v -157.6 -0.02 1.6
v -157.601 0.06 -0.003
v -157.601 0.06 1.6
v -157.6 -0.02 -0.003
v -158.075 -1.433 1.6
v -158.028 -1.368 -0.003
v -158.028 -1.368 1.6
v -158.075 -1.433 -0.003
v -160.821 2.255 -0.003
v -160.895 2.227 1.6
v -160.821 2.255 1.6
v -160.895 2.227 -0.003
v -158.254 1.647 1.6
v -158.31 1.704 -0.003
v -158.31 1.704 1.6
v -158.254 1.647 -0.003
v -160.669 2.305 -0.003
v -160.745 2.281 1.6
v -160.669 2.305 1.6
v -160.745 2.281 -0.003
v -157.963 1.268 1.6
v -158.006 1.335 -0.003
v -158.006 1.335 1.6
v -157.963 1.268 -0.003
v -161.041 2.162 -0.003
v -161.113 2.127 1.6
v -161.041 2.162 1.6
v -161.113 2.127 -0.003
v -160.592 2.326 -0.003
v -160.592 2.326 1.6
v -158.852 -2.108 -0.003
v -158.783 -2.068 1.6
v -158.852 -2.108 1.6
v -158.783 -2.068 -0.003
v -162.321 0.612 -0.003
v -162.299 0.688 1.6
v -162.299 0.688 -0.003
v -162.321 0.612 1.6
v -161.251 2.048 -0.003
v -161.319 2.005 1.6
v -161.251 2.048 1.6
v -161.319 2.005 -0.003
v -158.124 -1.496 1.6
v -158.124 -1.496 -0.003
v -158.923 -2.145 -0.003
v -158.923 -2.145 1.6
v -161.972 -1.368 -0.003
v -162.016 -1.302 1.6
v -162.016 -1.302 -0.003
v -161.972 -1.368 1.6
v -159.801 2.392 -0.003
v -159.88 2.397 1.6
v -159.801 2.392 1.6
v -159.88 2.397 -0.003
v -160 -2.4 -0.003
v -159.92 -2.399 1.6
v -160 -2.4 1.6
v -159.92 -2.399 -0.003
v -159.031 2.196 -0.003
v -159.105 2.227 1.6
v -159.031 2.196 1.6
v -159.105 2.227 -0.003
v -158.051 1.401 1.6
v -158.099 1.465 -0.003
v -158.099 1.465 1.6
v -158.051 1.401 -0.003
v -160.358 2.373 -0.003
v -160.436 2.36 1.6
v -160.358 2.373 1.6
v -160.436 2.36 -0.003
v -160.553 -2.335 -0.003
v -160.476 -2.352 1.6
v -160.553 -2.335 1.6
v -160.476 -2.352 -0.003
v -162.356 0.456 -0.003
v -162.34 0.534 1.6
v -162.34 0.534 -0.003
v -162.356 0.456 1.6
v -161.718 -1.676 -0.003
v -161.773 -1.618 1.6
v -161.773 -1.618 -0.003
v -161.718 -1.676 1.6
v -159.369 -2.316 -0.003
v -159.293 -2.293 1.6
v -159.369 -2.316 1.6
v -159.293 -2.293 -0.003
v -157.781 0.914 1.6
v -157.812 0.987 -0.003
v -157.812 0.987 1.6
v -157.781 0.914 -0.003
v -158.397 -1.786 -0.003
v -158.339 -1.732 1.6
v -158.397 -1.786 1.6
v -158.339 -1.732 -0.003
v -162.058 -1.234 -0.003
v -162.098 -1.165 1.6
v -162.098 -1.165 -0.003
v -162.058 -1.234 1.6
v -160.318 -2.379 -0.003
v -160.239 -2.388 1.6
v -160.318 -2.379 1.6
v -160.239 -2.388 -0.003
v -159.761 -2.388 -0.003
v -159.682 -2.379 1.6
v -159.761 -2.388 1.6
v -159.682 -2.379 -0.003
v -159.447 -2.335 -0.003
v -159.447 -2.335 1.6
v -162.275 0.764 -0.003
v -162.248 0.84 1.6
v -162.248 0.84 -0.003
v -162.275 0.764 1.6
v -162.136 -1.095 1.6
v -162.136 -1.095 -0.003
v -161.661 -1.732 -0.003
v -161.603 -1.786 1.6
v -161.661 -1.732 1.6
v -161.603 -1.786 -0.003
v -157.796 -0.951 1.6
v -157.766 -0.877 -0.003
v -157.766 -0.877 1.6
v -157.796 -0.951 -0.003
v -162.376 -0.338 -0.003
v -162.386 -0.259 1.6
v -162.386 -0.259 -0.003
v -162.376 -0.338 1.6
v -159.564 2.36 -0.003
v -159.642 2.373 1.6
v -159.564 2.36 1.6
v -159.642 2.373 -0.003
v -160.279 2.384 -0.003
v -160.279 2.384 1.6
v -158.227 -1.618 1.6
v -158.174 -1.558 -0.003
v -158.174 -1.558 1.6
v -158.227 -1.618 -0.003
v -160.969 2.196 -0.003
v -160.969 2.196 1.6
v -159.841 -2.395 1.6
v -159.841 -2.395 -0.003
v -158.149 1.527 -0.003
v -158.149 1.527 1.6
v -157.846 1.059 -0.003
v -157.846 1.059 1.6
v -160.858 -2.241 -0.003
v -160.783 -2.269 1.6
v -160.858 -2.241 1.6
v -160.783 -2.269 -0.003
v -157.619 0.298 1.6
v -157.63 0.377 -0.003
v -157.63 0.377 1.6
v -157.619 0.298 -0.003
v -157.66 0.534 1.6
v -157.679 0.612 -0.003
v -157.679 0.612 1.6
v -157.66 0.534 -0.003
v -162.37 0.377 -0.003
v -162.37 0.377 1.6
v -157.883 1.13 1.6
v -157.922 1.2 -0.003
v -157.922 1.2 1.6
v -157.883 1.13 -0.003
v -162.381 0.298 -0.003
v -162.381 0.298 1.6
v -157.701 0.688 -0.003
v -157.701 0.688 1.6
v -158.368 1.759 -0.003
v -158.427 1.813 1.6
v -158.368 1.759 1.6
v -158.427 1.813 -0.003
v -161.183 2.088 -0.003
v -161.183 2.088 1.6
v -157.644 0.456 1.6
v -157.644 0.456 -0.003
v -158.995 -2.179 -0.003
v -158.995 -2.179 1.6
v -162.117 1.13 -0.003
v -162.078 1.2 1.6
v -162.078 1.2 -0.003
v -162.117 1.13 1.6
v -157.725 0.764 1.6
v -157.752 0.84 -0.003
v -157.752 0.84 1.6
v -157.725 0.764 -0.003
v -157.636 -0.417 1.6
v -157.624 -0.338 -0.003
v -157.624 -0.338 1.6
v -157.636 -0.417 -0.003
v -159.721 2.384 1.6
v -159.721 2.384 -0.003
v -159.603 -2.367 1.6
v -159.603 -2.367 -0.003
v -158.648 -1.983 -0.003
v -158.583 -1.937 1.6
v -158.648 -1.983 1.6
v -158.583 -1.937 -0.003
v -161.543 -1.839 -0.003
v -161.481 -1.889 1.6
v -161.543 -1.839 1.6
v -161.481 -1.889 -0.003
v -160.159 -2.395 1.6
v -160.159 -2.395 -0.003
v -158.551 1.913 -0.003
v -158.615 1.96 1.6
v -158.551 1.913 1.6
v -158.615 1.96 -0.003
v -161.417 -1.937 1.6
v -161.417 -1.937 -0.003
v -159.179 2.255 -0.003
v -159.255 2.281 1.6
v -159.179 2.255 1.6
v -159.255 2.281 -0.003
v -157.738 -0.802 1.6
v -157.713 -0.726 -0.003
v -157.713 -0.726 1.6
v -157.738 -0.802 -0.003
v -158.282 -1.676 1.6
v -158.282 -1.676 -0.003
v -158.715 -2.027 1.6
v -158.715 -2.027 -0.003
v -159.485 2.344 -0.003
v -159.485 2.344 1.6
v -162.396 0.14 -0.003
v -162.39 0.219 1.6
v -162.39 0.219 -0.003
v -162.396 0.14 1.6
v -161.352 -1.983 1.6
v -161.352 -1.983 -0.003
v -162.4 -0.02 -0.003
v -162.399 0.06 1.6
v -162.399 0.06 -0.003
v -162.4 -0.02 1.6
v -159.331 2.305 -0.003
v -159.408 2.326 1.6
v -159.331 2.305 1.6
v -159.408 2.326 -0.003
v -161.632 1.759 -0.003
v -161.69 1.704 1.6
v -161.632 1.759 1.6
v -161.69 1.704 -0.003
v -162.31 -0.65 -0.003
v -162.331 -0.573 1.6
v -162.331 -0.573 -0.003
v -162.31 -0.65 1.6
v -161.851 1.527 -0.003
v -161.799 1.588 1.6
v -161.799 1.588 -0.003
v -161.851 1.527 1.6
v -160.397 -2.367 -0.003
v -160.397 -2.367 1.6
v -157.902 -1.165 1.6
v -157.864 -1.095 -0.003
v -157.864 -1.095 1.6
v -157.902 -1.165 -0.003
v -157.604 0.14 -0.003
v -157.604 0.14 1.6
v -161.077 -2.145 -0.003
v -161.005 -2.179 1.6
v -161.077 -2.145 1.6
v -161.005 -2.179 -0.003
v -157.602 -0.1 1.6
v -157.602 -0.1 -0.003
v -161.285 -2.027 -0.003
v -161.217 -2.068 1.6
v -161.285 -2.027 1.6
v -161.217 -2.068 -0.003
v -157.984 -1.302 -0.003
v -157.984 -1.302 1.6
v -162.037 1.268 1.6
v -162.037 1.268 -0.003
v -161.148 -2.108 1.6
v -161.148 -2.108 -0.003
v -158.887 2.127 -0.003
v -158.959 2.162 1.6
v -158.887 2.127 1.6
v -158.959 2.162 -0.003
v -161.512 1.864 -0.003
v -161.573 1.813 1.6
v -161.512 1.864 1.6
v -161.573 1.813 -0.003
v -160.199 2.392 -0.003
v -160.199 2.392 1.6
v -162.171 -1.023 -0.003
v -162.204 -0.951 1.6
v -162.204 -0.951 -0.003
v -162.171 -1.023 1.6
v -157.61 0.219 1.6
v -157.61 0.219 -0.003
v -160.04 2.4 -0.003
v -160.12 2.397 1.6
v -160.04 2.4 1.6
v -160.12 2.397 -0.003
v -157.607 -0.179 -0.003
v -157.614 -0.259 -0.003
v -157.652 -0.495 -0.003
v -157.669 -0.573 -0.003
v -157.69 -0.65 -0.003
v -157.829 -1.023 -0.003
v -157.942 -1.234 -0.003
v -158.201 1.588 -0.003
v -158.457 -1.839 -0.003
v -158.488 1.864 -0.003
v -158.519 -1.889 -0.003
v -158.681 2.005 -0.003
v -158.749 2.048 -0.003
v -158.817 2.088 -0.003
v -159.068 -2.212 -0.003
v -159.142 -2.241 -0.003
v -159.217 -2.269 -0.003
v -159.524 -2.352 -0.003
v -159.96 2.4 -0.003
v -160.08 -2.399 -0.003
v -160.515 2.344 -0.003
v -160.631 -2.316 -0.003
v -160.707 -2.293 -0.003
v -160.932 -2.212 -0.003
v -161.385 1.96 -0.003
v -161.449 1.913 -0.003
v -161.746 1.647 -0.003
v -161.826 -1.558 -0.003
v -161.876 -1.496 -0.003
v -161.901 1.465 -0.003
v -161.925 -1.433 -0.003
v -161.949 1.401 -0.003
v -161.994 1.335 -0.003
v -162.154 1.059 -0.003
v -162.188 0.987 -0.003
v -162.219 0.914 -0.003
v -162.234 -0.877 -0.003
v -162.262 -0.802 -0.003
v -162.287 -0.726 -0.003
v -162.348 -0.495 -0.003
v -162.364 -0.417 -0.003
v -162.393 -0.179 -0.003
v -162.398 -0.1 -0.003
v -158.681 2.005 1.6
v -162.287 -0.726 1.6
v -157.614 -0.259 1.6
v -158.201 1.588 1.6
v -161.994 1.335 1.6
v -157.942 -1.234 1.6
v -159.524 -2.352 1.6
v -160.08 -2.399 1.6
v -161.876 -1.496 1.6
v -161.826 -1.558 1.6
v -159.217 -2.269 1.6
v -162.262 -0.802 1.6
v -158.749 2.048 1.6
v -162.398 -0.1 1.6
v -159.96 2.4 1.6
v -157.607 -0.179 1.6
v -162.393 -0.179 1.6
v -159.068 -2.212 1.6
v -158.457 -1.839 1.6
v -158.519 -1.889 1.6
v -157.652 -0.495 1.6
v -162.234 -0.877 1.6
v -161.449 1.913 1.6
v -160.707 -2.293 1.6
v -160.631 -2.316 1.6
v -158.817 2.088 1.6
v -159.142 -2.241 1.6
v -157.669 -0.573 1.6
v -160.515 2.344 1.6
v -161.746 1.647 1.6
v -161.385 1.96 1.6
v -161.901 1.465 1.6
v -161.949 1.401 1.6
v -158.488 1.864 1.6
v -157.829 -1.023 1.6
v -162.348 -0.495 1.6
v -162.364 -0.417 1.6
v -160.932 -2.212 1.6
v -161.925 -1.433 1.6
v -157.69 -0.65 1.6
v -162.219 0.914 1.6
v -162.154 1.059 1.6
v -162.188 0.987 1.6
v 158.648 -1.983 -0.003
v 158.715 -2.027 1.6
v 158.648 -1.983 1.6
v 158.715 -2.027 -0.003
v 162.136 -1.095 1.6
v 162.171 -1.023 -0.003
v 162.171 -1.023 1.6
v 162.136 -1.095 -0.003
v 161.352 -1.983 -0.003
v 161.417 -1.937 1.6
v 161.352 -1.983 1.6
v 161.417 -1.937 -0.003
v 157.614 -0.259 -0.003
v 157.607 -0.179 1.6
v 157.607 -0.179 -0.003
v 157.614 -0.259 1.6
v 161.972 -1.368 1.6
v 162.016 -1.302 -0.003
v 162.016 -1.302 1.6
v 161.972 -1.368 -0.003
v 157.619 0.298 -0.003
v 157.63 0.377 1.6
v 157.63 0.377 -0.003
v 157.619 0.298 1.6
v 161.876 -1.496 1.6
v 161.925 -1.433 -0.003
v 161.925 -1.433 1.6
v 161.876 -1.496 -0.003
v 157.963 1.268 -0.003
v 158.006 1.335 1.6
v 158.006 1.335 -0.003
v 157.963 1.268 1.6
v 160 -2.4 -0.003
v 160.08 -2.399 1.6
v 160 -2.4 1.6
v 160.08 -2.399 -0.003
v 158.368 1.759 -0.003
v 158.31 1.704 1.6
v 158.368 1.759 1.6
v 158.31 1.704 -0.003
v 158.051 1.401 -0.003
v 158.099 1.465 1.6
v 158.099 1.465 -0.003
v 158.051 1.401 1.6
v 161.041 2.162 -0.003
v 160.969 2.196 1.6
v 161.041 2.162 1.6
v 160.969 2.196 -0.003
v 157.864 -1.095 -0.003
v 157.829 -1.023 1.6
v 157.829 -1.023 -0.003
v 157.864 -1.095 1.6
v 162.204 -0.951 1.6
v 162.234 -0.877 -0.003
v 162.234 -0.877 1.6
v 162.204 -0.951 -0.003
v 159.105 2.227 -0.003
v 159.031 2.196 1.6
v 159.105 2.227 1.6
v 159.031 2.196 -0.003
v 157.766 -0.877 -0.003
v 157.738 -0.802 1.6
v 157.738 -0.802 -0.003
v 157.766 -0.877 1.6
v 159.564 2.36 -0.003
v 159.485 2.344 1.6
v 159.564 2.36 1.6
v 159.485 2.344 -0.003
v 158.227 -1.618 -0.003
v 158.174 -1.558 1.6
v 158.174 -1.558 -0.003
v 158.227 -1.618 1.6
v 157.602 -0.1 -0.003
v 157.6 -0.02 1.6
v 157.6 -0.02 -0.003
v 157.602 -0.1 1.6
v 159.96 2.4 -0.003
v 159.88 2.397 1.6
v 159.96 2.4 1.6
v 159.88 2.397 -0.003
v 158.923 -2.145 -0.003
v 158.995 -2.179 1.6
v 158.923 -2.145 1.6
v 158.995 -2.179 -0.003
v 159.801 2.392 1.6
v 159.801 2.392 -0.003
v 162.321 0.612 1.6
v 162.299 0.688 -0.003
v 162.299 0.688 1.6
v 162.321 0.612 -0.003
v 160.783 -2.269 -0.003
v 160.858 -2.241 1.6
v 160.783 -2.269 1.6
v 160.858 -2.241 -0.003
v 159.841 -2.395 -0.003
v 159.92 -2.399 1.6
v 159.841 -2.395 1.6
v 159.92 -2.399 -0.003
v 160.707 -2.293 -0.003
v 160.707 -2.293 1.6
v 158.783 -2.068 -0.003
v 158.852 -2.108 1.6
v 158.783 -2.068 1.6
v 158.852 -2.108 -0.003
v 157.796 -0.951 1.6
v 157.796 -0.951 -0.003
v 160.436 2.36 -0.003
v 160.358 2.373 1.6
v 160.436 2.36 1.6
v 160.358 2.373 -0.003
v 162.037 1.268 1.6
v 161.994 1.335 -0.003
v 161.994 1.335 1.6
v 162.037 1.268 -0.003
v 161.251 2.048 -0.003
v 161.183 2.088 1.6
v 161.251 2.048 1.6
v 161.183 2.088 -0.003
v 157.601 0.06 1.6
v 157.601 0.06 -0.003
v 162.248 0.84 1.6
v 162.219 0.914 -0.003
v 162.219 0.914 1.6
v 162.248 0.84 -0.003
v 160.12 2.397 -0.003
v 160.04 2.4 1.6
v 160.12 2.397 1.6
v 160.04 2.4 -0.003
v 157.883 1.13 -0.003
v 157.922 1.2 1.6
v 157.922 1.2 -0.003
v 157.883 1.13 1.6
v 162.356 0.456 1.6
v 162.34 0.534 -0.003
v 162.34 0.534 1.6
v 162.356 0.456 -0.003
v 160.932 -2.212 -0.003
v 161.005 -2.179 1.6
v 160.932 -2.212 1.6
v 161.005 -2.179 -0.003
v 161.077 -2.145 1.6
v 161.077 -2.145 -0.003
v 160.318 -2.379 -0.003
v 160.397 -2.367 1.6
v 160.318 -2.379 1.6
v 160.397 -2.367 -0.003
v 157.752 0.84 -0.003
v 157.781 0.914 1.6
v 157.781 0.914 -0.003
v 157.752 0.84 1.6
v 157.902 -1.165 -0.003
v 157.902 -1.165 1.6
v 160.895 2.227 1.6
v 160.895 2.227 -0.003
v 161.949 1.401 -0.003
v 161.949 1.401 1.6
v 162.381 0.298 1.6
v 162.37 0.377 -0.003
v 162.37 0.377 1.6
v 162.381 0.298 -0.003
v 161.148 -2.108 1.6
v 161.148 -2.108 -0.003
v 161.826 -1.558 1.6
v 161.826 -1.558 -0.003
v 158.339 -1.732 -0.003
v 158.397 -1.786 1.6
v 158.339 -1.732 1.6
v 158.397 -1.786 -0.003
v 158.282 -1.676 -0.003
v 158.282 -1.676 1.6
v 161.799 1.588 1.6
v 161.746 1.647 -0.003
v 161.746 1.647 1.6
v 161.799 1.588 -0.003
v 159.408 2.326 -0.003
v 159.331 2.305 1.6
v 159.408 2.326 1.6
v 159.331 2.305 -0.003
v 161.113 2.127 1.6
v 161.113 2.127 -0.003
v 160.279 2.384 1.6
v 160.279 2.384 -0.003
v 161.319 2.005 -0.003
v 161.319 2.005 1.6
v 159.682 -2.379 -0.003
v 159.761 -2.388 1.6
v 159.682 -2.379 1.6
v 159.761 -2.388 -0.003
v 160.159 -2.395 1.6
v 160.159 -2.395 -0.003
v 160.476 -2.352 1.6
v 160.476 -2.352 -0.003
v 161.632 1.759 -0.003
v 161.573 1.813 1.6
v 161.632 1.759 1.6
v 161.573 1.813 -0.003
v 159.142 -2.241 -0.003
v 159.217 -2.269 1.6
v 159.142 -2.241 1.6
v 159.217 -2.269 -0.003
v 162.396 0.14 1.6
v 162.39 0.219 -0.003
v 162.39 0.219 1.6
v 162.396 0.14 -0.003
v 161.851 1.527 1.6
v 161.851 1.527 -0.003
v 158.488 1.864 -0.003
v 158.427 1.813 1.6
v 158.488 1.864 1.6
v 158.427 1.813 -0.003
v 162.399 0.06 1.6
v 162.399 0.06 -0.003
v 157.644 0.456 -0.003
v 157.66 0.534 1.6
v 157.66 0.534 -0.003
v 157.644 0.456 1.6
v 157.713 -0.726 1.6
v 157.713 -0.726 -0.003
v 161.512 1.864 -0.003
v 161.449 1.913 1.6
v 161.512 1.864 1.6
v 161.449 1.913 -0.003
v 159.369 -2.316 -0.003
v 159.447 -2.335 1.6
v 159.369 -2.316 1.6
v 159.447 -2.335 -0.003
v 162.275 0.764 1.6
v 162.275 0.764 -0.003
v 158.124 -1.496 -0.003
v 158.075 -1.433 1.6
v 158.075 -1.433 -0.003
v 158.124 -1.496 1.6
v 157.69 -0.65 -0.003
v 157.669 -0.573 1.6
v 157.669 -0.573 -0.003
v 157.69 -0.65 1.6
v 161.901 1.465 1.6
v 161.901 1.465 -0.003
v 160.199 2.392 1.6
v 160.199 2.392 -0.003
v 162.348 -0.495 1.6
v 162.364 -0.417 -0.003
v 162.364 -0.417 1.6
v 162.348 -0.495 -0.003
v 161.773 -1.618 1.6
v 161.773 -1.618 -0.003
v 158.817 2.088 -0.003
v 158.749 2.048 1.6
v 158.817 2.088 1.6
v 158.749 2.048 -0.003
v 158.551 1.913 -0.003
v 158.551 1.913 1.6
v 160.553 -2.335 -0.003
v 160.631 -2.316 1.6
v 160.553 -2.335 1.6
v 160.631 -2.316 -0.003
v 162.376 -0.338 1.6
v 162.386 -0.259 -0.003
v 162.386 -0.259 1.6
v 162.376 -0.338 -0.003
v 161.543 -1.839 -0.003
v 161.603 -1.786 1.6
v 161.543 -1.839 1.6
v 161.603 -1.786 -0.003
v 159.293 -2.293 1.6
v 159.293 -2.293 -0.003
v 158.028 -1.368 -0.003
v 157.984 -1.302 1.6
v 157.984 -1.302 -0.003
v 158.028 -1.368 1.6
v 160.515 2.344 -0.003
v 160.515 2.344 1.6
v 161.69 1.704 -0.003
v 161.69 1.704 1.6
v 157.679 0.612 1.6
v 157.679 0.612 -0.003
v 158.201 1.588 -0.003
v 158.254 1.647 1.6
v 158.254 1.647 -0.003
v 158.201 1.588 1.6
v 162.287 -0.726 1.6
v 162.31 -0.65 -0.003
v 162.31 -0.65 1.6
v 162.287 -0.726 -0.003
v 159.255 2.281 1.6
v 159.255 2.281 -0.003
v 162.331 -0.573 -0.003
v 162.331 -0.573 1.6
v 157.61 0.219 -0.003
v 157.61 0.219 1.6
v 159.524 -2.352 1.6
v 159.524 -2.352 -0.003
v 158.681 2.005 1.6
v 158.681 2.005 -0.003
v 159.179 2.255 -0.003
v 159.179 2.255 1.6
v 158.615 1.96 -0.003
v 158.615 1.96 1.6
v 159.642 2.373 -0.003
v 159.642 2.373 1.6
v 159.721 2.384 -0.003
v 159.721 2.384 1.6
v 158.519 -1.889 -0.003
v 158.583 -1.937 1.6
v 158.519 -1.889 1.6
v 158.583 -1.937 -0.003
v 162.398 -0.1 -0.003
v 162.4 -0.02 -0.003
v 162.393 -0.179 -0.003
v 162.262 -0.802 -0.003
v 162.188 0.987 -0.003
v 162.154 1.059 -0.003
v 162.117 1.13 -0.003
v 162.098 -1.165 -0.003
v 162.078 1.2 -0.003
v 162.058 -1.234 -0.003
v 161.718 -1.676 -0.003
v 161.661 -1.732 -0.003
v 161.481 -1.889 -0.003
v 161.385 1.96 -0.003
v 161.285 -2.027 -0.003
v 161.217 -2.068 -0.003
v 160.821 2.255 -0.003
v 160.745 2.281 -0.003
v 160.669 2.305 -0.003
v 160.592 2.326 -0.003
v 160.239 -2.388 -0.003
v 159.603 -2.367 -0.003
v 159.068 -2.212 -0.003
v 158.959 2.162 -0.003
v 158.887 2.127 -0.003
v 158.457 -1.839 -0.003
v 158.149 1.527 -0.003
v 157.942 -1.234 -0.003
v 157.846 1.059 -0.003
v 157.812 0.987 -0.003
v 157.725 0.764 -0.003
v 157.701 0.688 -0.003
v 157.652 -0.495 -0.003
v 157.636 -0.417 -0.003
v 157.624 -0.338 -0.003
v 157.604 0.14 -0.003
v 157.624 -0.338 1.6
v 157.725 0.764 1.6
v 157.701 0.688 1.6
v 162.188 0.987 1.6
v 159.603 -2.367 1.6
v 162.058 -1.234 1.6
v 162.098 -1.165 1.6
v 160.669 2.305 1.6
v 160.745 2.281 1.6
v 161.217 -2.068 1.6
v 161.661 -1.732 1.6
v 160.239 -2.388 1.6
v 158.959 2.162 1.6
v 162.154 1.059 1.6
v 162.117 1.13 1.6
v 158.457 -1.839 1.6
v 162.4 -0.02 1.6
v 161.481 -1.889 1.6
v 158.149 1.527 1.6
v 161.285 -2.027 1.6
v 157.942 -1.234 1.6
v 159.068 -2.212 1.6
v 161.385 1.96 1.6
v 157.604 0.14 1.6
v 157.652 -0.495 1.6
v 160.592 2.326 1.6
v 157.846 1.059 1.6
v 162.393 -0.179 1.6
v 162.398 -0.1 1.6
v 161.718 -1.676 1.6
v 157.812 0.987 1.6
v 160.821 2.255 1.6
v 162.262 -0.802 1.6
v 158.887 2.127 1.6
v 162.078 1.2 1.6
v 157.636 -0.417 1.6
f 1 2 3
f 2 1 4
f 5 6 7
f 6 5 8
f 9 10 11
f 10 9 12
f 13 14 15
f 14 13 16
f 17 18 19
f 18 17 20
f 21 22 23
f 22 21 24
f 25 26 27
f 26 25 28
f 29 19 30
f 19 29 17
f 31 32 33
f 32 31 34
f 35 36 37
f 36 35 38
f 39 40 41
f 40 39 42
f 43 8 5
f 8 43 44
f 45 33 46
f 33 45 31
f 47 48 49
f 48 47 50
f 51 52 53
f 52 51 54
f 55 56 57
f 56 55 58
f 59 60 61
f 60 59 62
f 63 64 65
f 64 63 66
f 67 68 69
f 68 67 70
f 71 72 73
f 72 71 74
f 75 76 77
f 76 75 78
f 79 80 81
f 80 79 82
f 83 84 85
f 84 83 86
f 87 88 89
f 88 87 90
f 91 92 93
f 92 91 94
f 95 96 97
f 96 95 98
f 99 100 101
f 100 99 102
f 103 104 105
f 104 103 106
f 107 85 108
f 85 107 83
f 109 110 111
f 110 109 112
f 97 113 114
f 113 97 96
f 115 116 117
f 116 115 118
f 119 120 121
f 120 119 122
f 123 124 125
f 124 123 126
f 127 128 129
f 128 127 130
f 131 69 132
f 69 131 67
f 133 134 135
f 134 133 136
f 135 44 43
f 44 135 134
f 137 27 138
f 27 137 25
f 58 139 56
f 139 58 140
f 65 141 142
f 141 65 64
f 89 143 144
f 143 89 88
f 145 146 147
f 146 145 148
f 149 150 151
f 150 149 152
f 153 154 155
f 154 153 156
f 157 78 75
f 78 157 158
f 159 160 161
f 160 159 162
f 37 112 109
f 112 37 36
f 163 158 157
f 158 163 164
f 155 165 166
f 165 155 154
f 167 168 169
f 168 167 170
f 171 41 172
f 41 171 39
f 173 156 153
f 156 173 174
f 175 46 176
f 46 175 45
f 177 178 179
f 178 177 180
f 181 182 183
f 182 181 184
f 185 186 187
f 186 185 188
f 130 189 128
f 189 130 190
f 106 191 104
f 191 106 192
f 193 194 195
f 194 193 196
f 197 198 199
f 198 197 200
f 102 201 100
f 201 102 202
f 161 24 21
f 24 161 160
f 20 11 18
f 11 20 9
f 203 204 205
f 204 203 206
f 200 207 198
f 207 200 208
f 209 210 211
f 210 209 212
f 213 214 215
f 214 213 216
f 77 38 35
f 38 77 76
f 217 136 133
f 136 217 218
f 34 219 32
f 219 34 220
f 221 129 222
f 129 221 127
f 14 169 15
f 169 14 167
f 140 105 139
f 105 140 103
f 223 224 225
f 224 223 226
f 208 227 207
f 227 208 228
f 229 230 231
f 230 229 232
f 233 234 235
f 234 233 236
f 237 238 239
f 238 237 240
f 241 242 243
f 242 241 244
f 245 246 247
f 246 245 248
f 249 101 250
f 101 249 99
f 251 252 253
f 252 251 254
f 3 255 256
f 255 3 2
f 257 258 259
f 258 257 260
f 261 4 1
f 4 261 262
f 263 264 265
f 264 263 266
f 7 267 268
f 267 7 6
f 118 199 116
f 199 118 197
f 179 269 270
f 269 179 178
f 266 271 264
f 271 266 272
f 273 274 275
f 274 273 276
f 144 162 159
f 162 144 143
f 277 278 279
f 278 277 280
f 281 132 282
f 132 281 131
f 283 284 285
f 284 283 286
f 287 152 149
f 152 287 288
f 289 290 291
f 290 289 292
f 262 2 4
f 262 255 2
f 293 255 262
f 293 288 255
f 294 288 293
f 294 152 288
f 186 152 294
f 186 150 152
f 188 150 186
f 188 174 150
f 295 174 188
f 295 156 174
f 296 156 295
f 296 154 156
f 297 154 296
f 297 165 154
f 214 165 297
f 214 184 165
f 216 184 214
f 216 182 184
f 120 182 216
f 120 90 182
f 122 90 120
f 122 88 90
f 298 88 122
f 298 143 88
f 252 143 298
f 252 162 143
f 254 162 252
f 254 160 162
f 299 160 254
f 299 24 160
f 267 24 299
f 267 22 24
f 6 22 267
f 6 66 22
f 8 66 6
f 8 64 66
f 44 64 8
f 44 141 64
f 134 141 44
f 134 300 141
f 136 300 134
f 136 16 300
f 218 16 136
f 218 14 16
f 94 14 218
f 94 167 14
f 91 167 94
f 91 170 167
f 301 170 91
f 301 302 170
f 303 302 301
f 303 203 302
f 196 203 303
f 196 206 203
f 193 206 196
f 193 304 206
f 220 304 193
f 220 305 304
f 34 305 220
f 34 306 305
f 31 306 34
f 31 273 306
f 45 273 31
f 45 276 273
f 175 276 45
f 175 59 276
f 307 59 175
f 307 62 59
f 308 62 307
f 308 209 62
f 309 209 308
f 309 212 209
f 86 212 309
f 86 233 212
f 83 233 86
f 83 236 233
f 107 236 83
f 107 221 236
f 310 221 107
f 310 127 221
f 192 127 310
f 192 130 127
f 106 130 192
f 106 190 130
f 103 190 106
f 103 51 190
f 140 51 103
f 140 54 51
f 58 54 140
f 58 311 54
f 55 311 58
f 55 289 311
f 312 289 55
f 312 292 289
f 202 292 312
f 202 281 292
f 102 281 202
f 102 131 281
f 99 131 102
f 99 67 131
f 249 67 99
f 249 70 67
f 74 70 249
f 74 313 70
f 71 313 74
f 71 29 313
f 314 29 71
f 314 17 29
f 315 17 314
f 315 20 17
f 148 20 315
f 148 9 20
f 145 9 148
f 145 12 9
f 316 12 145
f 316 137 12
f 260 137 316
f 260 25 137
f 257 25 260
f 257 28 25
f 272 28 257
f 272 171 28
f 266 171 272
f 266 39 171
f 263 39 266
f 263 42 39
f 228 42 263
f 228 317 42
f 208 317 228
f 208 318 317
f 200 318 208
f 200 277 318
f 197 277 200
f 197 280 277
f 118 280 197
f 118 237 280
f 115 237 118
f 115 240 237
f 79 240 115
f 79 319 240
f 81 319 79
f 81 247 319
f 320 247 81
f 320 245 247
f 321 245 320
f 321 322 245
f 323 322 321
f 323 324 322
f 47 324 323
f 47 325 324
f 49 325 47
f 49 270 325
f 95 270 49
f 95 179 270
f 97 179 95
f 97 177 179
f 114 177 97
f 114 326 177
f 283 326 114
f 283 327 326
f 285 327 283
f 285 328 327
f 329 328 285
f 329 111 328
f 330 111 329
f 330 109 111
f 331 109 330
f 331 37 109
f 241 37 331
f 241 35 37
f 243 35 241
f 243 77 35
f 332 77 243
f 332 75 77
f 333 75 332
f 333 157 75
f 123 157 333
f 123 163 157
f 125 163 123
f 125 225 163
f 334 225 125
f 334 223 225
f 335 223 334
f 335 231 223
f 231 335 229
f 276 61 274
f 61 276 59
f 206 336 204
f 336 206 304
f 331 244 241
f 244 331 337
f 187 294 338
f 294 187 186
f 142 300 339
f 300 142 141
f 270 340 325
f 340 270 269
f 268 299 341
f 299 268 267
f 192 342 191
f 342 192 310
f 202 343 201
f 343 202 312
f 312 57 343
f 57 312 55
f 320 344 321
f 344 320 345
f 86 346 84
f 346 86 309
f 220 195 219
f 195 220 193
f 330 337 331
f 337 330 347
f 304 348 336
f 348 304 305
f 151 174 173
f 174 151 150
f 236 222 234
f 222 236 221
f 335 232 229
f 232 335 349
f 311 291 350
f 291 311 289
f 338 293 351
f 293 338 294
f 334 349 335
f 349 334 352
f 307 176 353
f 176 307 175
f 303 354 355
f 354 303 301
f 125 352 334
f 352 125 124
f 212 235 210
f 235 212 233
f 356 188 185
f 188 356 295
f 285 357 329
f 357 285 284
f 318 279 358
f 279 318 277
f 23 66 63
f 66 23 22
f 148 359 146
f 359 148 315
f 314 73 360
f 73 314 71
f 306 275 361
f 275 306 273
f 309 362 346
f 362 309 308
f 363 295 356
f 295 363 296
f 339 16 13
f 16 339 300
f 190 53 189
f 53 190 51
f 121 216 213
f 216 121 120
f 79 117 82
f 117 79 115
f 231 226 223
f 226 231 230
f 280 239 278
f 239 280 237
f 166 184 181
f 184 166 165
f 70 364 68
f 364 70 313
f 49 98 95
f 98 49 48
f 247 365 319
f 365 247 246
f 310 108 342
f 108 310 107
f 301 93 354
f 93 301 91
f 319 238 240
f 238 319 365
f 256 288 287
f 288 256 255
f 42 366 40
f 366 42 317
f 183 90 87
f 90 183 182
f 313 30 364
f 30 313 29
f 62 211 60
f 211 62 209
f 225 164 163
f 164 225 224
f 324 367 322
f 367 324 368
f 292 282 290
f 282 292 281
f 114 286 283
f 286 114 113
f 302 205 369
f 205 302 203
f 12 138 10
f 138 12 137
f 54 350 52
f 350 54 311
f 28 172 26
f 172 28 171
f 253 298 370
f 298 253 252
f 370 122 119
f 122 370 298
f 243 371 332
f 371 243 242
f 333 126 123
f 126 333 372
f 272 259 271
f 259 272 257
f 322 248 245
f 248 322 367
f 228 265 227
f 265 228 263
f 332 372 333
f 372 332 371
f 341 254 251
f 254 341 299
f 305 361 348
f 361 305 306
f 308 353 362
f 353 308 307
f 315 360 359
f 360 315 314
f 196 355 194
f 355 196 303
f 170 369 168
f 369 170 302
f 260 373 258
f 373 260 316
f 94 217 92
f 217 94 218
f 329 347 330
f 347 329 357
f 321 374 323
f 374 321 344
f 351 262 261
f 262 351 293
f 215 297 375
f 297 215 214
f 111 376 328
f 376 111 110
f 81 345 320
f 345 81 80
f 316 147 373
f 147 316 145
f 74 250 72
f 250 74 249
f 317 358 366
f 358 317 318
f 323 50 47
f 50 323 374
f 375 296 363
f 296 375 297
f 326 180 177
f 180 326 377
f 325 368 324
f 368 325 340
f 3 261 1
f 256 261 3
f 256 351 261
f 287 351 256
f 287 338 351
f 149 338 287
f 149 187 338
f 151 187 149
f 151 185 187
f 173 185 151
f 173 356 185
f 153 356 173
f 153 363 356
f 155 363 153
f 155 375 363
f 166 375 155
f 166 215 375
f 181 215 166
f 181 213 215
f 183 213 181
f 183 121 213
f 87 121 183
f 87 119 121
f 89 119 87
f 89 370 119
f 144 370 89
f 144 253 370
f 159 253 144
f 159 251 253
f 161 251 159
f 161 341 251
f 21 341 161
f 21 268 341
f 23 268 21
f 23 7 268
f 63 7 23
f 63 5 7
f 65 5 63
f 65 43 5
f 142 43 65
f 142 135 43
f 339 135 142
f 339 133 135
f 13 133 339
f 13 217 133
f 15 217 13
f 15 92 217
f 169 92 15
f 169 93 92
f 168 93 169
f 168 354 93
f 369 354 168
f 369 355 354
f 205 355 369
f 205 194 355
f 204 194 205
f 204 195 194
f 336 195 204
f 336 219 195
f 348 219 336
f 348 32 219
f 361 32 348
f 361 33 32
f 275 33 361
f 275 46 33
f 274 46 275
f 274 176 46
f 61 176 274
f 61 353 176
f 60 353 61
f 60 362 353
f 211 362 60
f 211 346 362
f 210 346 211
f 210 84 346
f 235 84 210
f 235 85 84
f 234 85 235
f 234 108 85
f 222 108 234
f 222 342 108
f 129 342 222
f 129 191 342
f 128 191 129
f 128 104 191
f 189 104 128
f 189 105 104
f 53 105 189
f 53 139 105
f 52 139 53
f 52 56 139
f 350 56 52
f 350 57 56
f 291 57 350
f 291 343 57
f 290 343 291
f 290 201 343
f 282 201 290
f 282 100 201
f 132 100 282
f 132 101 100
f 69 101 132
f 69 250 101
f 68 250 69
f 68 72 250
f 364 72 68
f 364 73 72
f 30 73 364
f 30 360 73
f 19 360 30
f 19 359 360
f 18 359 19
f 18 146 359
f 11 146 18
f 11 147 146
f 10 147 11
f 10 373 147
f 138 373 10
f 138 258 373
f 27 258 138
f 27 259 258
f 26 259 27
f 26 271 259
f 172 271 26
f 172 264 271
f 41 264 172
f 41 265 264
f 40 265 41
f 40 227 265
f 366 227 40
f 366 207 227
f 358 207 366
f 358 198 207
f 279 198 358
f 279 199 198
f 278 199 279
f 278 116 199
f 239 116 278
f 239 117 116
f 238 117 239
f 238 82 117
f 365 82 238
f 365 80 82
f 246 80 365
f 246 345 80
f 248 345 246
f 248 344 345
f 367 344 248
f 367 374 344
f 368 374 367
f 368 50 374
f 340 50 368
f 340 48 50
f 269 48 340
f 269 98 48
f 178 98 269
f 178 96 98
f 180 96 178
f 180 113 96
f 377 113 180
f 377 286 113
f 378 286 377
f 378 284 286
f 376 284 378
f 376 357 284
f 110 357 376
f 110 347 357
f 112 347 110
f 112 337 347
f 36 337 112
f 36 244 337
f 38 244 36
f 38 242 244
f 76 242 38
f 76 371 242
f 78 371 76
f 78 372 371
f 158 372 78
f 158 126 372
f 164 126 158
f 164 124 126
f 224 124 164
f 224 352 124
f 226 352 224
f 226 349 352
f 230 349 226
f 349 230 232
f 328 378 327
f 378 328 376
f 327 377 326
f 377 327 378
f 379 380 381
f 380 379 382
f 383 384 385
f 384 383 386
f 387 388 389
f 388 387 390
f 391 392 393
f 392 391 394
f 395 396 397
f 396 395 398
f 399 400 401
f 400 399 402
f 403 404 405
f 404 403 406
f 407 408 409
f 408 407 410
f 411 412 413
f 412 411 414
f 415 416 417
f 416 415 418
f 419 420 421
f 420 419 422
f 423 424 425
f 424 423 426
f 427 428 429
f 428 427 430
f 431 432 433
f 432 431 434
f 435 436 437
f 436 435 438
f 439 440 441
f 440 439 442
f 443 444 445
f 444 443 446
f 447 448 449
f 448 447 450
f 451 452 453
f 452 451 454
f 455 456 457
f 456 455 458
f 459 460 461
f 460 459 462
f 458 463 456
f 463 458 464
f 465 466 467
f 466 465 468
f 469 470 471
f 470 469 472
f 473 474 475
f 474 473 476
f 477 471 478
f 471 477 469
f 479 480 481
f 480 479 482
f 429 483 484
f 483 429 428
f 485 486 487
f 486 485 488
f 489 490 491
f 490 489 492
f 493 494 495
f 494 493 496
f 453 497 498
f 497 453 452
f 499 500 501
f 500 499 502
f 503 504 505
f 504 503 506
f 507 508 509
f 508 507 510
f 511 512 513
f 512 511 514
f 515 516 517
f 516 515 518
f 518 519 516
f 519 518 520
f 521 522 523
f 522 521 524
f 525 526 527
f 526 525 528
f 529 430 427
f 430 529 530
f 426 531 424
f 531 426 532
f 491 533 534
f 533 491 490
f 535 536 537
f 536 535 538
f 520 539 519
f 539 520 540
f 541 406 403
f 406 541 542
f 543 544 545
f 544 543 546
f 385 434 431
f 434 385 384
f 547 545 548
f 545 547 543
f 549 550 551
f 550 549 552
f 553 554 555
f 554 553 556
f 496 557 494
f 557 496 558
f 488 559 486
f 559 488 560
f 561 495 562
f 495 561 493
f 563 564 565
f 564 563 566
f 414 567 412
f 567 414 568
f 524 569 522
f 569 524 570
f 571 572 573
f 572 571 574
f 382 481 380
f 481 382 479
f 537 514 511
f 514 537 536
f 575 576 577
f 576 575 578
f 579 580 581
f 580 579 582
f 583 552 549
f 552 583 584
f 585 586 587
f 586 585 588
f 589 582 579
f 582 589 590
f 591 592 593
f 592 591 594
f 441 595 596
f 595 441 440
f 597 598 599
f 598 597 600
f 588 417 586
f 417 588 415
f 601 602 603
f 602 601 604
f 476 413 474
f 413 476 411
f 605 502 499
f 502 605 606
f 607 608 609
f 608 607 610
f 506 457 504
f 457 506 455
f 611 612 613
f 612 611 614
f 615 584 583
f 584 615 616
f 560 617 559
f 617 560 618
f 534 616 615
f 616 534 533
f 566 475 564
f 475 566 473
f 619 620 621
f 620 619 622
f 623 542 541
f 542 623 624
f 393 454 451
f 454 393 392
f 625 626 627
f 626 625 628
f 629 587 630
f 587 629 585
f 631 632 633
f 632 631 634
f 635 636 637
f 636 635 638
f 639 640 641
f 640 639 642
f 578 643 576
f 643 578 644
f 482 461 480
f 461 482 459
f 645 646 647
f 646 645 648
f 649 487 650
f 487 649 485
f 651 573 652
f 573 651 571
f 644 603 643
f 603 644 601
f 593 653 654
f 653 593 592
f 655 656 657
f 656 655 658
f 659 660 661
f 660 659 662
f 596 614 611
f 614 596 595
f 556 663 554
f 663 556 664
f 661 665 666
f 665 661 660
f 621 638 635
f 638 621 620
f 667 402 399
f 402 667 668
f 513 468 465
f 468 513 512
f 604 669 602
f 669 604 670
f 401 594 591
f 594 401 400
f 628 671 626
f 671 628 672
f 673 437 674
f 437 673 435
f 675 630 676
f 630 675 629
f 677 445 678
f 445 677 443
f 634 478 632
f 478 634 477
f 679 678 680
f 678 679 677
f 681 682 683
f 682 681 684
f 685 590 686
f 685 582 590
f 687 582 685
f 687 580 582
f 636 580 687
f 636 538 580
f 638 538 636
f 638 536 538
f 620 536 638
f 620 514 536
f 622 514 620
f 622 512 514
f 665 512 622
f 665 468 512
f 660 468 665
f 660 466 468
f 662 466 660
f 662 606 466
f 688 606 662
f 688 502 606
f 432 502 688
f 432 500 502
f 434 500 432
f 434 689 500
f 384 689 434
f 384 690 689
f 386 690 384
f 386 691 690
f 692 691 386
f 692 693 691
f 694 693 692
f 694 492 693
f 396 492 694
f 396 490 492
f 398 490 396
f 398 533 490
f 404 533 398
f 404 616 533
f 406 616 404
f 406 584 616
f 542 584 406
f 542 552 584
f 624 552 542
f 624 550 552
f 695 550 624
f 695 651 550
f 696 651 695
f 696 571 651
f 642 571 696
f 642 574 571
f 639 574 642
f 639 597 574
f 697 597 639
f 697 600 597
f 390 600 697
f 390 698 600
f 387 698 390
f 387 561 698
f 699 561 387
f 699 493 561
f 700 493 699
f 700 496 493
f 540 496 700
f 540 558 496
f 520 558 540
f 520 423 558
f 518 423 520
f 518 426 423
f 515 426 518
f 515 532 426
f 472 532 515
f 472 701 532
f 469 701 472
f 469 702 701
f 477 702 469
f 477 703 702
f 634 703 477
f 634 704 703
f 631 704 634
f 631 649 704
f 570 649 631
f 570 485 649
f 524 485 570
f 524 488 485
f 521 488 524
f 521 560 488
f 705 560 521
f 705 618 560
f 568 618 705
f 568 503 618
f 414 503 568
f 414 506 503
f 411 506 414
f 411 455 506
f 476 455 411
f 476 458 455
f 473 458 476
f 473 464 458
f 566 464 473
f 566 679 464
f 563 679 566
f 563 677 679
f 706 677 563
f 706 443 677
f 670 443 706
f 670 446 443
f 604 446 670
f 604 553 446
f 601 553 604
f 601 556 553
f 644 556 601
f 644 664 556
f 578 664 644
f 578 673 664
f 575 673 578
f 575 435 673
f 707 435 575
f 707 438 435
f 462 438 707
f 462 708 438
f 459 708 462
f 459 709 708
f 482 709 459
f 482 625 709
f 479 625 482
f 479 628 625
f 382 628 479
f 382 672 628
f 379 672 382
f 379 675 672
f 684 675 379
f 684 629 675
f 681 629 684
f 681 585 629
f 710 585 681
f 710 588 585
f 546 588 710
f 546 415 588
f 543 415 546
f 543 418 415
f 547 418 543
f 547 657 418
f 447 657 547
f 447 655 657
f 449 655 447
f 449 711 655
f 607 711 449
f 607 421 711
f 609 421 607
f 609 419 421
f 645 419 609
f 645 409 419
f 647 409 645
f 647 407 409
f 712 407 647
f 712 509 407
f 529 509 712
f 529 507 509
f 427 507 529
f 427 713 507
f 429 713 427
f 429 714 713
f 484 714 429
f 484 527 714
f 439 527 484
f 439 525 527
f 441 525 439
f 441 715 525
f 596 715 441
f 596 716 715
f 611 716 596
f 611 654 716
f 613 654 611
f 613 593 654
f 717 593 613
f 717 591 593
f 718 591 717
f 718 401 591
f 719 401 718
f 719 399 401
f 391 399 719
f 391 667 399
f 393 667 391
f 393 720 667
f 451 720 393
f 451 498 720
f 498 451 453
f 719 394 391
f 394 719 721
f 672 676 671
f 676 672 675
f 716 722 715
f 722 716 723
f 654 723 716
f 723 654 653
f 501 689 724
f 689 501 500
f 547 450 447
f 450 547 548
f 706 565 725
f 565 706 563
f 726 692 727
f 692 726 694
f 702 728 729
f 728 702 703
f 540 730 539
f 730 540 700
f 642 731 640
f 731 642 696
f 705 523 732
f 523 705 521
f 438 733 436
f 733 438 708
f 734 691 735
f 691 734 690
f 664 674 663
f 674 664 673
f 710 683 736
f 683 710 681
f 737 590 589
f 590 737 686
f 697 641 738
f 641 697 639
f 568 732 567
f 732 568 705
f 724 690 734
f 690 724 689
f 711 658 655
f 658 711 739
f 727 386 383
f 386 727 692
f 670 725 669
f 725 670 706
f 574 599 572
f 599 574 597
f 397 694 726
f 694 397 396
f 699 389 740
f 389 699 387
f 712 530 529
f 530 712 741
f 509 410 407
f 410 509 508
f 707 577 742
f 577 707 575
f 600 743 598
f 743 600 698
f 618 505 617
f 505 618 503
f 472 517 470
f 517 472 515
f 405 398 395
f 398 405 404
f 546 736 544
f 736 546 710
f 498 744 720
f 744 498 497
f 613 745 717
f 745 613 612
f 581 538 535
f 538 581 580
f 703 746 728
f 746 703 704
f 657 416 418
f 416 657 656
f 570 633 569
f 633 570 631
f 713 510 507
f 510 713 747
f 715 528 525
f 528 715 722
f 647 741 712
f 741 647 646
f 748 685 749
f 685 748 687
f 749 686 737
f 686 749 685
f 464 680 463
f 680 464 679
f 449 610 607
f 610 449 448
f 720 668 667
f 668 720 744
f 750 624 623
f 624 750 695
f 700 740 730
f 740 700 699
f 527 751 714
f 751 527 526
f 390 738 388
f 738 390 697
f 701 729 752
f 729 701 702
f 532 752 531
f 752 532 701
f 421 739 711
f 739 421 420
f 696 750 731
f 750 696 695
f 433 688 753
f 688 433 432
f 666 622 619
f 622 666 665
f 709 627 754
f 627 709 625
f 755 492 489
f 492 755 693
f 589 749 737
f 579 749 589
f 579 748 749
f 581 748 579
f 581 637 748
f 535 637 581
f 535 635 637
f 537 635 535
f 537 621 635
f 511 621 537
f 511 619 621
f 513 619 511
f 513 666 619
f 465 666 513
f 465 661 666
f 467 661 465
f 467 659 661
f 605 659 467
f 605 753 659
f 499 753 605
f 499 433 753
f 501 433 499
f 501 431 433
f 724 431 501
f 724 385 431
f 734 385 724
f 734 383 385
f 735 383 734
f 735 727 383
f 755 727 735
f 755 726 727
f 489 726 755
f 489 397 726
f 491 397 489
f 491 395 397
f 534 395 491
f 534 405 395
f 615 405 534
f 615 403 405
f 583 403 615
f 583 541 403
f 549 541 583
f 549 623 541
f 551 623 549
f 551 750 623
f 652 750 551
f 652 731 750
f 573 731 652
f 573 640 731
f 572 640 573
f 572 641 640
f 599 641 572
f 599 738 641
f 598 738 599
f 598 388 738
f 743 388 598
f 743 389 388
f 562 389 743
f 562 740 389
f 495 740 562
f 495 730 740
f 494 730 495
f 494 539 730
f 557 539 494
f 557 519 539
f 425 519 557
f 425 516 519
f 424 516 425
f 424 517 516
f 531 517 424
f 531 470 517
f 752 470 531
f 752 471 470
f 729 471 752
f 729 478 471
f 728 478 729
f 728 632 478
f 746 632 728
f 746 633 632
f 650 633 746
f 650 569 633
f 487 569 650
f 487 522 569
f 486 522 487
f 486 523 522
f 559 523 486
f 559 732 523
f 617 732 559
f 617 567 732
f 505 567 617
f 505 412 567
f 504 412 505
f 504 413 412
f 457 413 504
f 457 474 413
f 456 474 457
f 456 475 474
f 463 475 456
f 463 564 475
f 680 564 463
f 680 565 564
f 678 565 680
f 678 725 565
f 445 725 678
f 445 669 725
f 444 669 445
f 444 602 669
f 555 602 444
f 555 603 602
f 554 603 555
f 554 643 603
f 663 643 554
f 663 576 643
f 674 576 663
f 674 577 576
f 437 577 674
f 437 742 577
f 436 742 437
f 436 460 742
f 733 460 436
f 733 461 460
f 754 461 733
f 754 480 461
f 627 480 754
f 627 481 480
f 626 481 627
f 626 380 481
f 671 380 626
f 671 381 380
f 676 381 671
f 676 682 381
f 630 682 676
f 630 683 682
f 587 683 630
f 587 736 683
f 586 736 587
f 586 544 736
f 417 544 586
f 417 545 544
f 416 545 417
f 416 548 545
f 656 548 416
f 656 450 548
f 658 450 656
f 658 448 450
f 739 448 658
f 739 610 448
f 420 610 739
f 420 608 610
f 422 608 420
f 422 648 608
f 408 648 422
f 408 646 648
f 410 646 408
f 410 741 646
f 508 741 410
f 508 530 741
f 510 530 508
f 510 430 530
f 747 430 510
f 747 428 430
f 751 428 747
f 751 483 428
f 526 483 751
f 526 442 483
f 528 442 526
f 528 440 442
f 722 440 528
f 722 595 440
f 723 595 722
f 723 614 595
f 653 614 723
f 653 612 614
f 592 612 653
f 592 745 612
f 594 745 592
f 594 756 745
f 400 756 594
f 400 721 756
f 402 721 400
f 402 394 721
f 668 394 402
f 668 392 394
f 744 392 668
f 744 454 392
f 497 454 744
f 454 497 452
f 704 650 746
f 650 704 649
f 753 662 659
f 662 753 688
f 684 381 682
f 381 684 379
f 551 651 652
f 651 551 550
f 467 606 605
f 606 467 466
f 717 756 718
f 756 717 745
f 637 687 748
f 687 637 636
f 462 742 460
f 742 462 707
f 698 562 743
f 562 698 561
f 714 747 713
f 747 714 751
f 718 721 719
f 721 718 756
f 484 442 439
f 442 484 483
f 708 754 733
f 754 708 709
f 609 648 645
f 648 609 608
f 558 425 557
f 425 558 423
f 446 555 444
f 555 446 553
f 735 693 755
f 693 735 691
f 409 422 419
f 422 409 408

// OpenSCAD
use <../lib.scad>
use <572a.scad>
use <572b.scad>
$fa=1; $fs=0.2;
function ldraw_lib__572c02(realsolid=false) = [
// 0 String Braided 41L with End Studs (Complete)
// 0 Name: 572c02.dat
// 0 Author: Steve Bliss [sbliss]
// 0 !LDRAW_ORG Shortcut UPDATE 2005-01
// 0 !LICENSE Licensed under CC BY 2.0 and CC BY 4.0 : see CAreadme.txt
// 
// 0 BFC CERTIFY CCW
  [0,"BFC","CERTIFY"],
  [0,"BFC","CCW"],
// 
// 0 !KEYWORDS Line, rigging
// 
// 0 !HISTORY 2005-12-28 [PTadmin] Official Update 2005-01
// 0 !HISTORY 2007-07-09 [PTadmin] Header formatted for Contributor Agreement
// 0 !HISTORY 2008-07-01 [PTadmin] Official Update 2008-01
// 
// 
// 1 16 -400 0 0 1 0 0 0 1 0 0 0 1 572a.dat
  [1,16,-400,0,0,1,0,0,0,1,0,0,0,1, ldraw_lib__572a(realsolid)],
// 1 16 -381 1.5 0 1.2 0 0 0 1 0 0 0 1 572b.dat
  [1,16,-381,1.5,0,1.2,0,0,0,1,0,0,0,1, ldraw_lib__572b(realsolid)],
// 1 16 -360 1.5 0 1 0 0 0 1 0 0 0 1 572b.dat
  [1,16,-360,1.5,0,1,0,0,0,1,0,0,0,1, ldraw_lib__572b(realsolid)],
// 1 16 -340 1.5 0 1 0 0 0 1 0 0 0 1 572b.dat
  [1,16,-340,1.5,0,1,0,0,0,1,0,0,0,1, ldraw_lib__572b(realsolid)],
// 1 16 -320 1.5 0 1 0 0 0 1 0 0 0 1 572b.dat
  [1,16,-320,1.5,0,1,0,0,0,1,0,0,0,1, ldraw_lib__572b(realsolid)],
// 1 16 -300 1.5 0 1 0 0 0 1 0 0 0 1 572b.dat
  [1,16,-300,1.5,0,1,0,0,0,1,0,0,0,1, ldraw_lib__572b(realsolid)],
// 1 16 -280 1.5 0 1 0 0 0 1 0 0 0 1 572b.dat
  [1,16,-280,1.5,0,1,0,0,0,1,0,0,0,1, ldraw_lib__572b(realsolid)],
// 1 16 -260 1.5 0 1 0 0 0 1 0 0 0 1 572b.dat
  [1,16,-260,1.5,0,1,0,0,0,1,0,0,0,1, ldraw_lib__572b(realsolid)],
// 1 16 -240 1.5 0 1 0 0 0 1 0 0 0 1 572b.dat
  [1,16,-240,1.5,0,1,0,0,0,1,0,0,0,1, ldraw_lib__572b(realsolid)],
// 1 16 -220 1.5 0 1 0 0 0 1 0 0 0 1 572b.dat
  [1,16,-220,1.5,0,1,0,0,0,1,0,0,0,1, ldraw_lib__572b(realsolid)],
// 1 16 -200 1.5 0 1 0 0 0 1 0 0 0 1 572b.dat
  [1,16,-200,1.5,0,1,0,0,0,1,0,0,0,1, ldraw_lib__572b(realsolid)],
// 1 16 -180 1.5 0 1 0 0 0 1 0 0 0 1 572b.dat
  [1,16,-180,1.5,0,1,0,0,0,1,0,0,0,1, ldraw_lib__572b(realsolid)],
// 1 16 -160 1.5 0 1 0 0 0 1 0 0 0 1 572b.dat
  [1,16,-160,1.5,0,1,0,0,0,1,0,0,0,1, ldraw_lib__572b(realsolid)],
// 1 16 -140 1.5 0 1 0 0 0 1 0 0 0 1 572b.dat
  [1,16,-140,1.5,0,1,0,0,0,1,0,0,0,1, ldraw_lib__572b(realsolid)],
// 1 16 -120 1.5 0 1 0 0 0 1 0 0 0 1 572b.dat
  [1,16,-120,1.5,0,1,0,0,0,1,0,0,0,1, ldraw_lib__572b(realsolid)],
// 1 16 -100 1.5 0 1 0 0 0 1 0 0 0 1 572b.dat
  [1,16,-100,1.5,0,1,0,0,0,1,0,0,0,1, ldraw_lib__572b(realsolid)],
// 1 16 -80 1.5 0 1 0 0 0 1 0 0 0 1 572b.dat
  [1,16,-80,1.5,0,1,0,0,0,1,0,0,0,1, ldraw_lib__572b(realsolid)],
// 1 16 -60 1.5 0 1 0 0 0 1 0 0 0 1 572b.dat
  [1,16,-60,1.5,0,1,0,0,0,1,0,0,0,1, ldraw_lib__572b(realsolid)],
// 1 16 -40 1.5 0 1 0 0 0 1 0 0 0 1 572b.dat
  [1,16,-40,1.5,0,1,0,0,0,1,0,0,0,1, ldraw_lib__572b(realsolid)],
// 1 16 -20 1.5 0 1 0 0 0 1 0 0 0 1 572b.dat
  [1,16,-20,1.5,0,1,0,0,0,1,0,0,0,1, ldraw_lib__572b(realsolid)],
// 1 16 0 1.5 0 1 0 0 0 1 0 0 0 1 572b.dat
  [1,16,0,1.5,0,1,0,0,0,1,0,0,0,1, ldraw_lib__572b(realsolid)],
// 1 16 20 1.5 0 1 0 0 0 1 0 0 0 1 572b.dat
  [1,16,20,1.5,0,1,0,0,0,1,0,0,0,1, ldraw_lib__572b(realsolid)],
// 1 16 40 1.5 0 1 0 0 0 1 0 0 0 1 572b.dat
  [1,16,40,1.5,0,1,0,0,0,1,0,0,0,1, ldraw_lib__572b(realsolid)],
// 1 16 60 1.5 0 1 0 0 0 1 0 0 0 1 572b.dat
  [1,16,60,1.5,0,1,0,0,0,1,0,0,0,1, ldraw_lib__572b(realsolid)],
// 1 16 80 1.5 0 1 0 0 0 1 0 0 0 1 572b.dat
  [1,16,80,1.5,0,1,0,0,0,1,0,0,0,1, ldraw_lib__572b(realsolid)],
// 1 16 100 1.5 0 1 0 0 0 1 0 0 0 1 572b.dat
  [1,16,100,1.5,0,1,0,0,0,1,0,0,0,1, ldraw_lib__572b(realsolid)],
// 1 16 120 1.5 0 1 0 0 0 1 0 0 0 1 572b.dat
  [1,16,120,1.5,0,1,0,0,0,1,0,0,0,1, ldraw_lib__572b(realsolid)],
// 1 16 140 1.5 0 1 0 0 0 1 0 0 0 1 572b.dat
  [1,16,140,1.5,0,1,0,0,0,1,0,0,0,1, ldraw_lib__572b(realsolid)],
// 1 16 160 1.5 0 1 0 0 0 1 0 0 0 1 572b.dat
  [1,16,160,1.5,0,1,0,0,0,1,0,0,0,1, ldraw_lib__572b(realsolid)],
// 1 16 180 1.5 0 1 0 0 0 1 0 0 0 1 572b.dat
  [1,16,180,1.5,0,1,0,0,0,1,0,0,0,1, ldraw_lib__572b(realsolid)],
// 1 16 200 1.5 0 1 0 0 0 1 0 0 0 1 572b.dat
  [1,16,200,1.5,0,1,0,0,0,1,0,0,0,1, ldraw_lib__572b(realsolid)],
// 1 16 220 1.5 0 1 0 0 0 1 0 0 0 1 572b.dat
  [1,16,220,1.5,0,1,0,0,0,1,0,0,0,1, ldraw_lib__572b(realsolid)],
// 1 16 240 1.5 0 1 0 0 0 1 0 0 0 1 572b.dat
  [1,16,240,1.5,0,1,0,0,0,1,0,0,0,1, ldraw_lib__572b(realsolid)],
// 1 16 260 1.5 0 1 0 0 0 1 0 0 0 1 572b.dat
  [1,16,260,1.5,0,1,0,0,0,1,0,0,0,1, ldraw_lib__572b(realsolid)],
// 1 16 280 1.5 0 1 0 0 0 1 0 0 0 1 572b.dat
  [1,16,280,1.5,0,1,0,0,0,1,0,0,0,1, ldraw_lib__572b(realsolid)],
// 1 16 300 1.5 0 1 0 0 0 1 0 0 0 1 572b.dat
  [1,16,300,1.5,0,1,0,0,0,1,0,0,0,1, ldraw_lib__572b(realsolid)],
// 1 16 320 1.5 0 1 0 0 0 1 0 0 0 1 572b.dat
  [1,16,320,1.5,0,1,0,0,0,1,0,0,0,1, ldraw_lib__572b(realsolid)],
// 1 16 340 1.5 0 1 0 0 0 1 0 0 0 1 572b.dat
  [1,16,340,1.5,0,1,0,0,0,1,0,0,0,1, ldraw_lib__572b(realsolid)],
// 1 16 360 1.5 0 1 0 0 0 1 0 0 0 1 572b.dat
  [1,16,360,1.5,0,1,0,0,0,1,0,0,0,1, ldraw_lib__572b(realsolid)],
// 1 16 381 1.5 0 1.2 0 0 0 1 0 0 0 1 572b.dat
  [1,16,381,1.5,0,1.2,0,0,0,1,0,0,0,1, ldraw_lib__572b(realsolid)],
// 1 16 400 0 0 1 0 0 0 1 0 0 0 1 572a.dat
  [1,16,400,0,0,1,0,0,0,1,0,0,0,1, ldraw_lib__572a(realsolid)],
// 0
];
module ldraw_lib__572c02(step=0, col=false, unit=2/5, alt=false, line=0.2, solid=!$preview)
    makepoly(ldraw_lib__572c02(solid), step=step, col=col, unit=unit, alt=alt, line=line, solid=solid);
ldraw_lib__572c02(line=0.2);
